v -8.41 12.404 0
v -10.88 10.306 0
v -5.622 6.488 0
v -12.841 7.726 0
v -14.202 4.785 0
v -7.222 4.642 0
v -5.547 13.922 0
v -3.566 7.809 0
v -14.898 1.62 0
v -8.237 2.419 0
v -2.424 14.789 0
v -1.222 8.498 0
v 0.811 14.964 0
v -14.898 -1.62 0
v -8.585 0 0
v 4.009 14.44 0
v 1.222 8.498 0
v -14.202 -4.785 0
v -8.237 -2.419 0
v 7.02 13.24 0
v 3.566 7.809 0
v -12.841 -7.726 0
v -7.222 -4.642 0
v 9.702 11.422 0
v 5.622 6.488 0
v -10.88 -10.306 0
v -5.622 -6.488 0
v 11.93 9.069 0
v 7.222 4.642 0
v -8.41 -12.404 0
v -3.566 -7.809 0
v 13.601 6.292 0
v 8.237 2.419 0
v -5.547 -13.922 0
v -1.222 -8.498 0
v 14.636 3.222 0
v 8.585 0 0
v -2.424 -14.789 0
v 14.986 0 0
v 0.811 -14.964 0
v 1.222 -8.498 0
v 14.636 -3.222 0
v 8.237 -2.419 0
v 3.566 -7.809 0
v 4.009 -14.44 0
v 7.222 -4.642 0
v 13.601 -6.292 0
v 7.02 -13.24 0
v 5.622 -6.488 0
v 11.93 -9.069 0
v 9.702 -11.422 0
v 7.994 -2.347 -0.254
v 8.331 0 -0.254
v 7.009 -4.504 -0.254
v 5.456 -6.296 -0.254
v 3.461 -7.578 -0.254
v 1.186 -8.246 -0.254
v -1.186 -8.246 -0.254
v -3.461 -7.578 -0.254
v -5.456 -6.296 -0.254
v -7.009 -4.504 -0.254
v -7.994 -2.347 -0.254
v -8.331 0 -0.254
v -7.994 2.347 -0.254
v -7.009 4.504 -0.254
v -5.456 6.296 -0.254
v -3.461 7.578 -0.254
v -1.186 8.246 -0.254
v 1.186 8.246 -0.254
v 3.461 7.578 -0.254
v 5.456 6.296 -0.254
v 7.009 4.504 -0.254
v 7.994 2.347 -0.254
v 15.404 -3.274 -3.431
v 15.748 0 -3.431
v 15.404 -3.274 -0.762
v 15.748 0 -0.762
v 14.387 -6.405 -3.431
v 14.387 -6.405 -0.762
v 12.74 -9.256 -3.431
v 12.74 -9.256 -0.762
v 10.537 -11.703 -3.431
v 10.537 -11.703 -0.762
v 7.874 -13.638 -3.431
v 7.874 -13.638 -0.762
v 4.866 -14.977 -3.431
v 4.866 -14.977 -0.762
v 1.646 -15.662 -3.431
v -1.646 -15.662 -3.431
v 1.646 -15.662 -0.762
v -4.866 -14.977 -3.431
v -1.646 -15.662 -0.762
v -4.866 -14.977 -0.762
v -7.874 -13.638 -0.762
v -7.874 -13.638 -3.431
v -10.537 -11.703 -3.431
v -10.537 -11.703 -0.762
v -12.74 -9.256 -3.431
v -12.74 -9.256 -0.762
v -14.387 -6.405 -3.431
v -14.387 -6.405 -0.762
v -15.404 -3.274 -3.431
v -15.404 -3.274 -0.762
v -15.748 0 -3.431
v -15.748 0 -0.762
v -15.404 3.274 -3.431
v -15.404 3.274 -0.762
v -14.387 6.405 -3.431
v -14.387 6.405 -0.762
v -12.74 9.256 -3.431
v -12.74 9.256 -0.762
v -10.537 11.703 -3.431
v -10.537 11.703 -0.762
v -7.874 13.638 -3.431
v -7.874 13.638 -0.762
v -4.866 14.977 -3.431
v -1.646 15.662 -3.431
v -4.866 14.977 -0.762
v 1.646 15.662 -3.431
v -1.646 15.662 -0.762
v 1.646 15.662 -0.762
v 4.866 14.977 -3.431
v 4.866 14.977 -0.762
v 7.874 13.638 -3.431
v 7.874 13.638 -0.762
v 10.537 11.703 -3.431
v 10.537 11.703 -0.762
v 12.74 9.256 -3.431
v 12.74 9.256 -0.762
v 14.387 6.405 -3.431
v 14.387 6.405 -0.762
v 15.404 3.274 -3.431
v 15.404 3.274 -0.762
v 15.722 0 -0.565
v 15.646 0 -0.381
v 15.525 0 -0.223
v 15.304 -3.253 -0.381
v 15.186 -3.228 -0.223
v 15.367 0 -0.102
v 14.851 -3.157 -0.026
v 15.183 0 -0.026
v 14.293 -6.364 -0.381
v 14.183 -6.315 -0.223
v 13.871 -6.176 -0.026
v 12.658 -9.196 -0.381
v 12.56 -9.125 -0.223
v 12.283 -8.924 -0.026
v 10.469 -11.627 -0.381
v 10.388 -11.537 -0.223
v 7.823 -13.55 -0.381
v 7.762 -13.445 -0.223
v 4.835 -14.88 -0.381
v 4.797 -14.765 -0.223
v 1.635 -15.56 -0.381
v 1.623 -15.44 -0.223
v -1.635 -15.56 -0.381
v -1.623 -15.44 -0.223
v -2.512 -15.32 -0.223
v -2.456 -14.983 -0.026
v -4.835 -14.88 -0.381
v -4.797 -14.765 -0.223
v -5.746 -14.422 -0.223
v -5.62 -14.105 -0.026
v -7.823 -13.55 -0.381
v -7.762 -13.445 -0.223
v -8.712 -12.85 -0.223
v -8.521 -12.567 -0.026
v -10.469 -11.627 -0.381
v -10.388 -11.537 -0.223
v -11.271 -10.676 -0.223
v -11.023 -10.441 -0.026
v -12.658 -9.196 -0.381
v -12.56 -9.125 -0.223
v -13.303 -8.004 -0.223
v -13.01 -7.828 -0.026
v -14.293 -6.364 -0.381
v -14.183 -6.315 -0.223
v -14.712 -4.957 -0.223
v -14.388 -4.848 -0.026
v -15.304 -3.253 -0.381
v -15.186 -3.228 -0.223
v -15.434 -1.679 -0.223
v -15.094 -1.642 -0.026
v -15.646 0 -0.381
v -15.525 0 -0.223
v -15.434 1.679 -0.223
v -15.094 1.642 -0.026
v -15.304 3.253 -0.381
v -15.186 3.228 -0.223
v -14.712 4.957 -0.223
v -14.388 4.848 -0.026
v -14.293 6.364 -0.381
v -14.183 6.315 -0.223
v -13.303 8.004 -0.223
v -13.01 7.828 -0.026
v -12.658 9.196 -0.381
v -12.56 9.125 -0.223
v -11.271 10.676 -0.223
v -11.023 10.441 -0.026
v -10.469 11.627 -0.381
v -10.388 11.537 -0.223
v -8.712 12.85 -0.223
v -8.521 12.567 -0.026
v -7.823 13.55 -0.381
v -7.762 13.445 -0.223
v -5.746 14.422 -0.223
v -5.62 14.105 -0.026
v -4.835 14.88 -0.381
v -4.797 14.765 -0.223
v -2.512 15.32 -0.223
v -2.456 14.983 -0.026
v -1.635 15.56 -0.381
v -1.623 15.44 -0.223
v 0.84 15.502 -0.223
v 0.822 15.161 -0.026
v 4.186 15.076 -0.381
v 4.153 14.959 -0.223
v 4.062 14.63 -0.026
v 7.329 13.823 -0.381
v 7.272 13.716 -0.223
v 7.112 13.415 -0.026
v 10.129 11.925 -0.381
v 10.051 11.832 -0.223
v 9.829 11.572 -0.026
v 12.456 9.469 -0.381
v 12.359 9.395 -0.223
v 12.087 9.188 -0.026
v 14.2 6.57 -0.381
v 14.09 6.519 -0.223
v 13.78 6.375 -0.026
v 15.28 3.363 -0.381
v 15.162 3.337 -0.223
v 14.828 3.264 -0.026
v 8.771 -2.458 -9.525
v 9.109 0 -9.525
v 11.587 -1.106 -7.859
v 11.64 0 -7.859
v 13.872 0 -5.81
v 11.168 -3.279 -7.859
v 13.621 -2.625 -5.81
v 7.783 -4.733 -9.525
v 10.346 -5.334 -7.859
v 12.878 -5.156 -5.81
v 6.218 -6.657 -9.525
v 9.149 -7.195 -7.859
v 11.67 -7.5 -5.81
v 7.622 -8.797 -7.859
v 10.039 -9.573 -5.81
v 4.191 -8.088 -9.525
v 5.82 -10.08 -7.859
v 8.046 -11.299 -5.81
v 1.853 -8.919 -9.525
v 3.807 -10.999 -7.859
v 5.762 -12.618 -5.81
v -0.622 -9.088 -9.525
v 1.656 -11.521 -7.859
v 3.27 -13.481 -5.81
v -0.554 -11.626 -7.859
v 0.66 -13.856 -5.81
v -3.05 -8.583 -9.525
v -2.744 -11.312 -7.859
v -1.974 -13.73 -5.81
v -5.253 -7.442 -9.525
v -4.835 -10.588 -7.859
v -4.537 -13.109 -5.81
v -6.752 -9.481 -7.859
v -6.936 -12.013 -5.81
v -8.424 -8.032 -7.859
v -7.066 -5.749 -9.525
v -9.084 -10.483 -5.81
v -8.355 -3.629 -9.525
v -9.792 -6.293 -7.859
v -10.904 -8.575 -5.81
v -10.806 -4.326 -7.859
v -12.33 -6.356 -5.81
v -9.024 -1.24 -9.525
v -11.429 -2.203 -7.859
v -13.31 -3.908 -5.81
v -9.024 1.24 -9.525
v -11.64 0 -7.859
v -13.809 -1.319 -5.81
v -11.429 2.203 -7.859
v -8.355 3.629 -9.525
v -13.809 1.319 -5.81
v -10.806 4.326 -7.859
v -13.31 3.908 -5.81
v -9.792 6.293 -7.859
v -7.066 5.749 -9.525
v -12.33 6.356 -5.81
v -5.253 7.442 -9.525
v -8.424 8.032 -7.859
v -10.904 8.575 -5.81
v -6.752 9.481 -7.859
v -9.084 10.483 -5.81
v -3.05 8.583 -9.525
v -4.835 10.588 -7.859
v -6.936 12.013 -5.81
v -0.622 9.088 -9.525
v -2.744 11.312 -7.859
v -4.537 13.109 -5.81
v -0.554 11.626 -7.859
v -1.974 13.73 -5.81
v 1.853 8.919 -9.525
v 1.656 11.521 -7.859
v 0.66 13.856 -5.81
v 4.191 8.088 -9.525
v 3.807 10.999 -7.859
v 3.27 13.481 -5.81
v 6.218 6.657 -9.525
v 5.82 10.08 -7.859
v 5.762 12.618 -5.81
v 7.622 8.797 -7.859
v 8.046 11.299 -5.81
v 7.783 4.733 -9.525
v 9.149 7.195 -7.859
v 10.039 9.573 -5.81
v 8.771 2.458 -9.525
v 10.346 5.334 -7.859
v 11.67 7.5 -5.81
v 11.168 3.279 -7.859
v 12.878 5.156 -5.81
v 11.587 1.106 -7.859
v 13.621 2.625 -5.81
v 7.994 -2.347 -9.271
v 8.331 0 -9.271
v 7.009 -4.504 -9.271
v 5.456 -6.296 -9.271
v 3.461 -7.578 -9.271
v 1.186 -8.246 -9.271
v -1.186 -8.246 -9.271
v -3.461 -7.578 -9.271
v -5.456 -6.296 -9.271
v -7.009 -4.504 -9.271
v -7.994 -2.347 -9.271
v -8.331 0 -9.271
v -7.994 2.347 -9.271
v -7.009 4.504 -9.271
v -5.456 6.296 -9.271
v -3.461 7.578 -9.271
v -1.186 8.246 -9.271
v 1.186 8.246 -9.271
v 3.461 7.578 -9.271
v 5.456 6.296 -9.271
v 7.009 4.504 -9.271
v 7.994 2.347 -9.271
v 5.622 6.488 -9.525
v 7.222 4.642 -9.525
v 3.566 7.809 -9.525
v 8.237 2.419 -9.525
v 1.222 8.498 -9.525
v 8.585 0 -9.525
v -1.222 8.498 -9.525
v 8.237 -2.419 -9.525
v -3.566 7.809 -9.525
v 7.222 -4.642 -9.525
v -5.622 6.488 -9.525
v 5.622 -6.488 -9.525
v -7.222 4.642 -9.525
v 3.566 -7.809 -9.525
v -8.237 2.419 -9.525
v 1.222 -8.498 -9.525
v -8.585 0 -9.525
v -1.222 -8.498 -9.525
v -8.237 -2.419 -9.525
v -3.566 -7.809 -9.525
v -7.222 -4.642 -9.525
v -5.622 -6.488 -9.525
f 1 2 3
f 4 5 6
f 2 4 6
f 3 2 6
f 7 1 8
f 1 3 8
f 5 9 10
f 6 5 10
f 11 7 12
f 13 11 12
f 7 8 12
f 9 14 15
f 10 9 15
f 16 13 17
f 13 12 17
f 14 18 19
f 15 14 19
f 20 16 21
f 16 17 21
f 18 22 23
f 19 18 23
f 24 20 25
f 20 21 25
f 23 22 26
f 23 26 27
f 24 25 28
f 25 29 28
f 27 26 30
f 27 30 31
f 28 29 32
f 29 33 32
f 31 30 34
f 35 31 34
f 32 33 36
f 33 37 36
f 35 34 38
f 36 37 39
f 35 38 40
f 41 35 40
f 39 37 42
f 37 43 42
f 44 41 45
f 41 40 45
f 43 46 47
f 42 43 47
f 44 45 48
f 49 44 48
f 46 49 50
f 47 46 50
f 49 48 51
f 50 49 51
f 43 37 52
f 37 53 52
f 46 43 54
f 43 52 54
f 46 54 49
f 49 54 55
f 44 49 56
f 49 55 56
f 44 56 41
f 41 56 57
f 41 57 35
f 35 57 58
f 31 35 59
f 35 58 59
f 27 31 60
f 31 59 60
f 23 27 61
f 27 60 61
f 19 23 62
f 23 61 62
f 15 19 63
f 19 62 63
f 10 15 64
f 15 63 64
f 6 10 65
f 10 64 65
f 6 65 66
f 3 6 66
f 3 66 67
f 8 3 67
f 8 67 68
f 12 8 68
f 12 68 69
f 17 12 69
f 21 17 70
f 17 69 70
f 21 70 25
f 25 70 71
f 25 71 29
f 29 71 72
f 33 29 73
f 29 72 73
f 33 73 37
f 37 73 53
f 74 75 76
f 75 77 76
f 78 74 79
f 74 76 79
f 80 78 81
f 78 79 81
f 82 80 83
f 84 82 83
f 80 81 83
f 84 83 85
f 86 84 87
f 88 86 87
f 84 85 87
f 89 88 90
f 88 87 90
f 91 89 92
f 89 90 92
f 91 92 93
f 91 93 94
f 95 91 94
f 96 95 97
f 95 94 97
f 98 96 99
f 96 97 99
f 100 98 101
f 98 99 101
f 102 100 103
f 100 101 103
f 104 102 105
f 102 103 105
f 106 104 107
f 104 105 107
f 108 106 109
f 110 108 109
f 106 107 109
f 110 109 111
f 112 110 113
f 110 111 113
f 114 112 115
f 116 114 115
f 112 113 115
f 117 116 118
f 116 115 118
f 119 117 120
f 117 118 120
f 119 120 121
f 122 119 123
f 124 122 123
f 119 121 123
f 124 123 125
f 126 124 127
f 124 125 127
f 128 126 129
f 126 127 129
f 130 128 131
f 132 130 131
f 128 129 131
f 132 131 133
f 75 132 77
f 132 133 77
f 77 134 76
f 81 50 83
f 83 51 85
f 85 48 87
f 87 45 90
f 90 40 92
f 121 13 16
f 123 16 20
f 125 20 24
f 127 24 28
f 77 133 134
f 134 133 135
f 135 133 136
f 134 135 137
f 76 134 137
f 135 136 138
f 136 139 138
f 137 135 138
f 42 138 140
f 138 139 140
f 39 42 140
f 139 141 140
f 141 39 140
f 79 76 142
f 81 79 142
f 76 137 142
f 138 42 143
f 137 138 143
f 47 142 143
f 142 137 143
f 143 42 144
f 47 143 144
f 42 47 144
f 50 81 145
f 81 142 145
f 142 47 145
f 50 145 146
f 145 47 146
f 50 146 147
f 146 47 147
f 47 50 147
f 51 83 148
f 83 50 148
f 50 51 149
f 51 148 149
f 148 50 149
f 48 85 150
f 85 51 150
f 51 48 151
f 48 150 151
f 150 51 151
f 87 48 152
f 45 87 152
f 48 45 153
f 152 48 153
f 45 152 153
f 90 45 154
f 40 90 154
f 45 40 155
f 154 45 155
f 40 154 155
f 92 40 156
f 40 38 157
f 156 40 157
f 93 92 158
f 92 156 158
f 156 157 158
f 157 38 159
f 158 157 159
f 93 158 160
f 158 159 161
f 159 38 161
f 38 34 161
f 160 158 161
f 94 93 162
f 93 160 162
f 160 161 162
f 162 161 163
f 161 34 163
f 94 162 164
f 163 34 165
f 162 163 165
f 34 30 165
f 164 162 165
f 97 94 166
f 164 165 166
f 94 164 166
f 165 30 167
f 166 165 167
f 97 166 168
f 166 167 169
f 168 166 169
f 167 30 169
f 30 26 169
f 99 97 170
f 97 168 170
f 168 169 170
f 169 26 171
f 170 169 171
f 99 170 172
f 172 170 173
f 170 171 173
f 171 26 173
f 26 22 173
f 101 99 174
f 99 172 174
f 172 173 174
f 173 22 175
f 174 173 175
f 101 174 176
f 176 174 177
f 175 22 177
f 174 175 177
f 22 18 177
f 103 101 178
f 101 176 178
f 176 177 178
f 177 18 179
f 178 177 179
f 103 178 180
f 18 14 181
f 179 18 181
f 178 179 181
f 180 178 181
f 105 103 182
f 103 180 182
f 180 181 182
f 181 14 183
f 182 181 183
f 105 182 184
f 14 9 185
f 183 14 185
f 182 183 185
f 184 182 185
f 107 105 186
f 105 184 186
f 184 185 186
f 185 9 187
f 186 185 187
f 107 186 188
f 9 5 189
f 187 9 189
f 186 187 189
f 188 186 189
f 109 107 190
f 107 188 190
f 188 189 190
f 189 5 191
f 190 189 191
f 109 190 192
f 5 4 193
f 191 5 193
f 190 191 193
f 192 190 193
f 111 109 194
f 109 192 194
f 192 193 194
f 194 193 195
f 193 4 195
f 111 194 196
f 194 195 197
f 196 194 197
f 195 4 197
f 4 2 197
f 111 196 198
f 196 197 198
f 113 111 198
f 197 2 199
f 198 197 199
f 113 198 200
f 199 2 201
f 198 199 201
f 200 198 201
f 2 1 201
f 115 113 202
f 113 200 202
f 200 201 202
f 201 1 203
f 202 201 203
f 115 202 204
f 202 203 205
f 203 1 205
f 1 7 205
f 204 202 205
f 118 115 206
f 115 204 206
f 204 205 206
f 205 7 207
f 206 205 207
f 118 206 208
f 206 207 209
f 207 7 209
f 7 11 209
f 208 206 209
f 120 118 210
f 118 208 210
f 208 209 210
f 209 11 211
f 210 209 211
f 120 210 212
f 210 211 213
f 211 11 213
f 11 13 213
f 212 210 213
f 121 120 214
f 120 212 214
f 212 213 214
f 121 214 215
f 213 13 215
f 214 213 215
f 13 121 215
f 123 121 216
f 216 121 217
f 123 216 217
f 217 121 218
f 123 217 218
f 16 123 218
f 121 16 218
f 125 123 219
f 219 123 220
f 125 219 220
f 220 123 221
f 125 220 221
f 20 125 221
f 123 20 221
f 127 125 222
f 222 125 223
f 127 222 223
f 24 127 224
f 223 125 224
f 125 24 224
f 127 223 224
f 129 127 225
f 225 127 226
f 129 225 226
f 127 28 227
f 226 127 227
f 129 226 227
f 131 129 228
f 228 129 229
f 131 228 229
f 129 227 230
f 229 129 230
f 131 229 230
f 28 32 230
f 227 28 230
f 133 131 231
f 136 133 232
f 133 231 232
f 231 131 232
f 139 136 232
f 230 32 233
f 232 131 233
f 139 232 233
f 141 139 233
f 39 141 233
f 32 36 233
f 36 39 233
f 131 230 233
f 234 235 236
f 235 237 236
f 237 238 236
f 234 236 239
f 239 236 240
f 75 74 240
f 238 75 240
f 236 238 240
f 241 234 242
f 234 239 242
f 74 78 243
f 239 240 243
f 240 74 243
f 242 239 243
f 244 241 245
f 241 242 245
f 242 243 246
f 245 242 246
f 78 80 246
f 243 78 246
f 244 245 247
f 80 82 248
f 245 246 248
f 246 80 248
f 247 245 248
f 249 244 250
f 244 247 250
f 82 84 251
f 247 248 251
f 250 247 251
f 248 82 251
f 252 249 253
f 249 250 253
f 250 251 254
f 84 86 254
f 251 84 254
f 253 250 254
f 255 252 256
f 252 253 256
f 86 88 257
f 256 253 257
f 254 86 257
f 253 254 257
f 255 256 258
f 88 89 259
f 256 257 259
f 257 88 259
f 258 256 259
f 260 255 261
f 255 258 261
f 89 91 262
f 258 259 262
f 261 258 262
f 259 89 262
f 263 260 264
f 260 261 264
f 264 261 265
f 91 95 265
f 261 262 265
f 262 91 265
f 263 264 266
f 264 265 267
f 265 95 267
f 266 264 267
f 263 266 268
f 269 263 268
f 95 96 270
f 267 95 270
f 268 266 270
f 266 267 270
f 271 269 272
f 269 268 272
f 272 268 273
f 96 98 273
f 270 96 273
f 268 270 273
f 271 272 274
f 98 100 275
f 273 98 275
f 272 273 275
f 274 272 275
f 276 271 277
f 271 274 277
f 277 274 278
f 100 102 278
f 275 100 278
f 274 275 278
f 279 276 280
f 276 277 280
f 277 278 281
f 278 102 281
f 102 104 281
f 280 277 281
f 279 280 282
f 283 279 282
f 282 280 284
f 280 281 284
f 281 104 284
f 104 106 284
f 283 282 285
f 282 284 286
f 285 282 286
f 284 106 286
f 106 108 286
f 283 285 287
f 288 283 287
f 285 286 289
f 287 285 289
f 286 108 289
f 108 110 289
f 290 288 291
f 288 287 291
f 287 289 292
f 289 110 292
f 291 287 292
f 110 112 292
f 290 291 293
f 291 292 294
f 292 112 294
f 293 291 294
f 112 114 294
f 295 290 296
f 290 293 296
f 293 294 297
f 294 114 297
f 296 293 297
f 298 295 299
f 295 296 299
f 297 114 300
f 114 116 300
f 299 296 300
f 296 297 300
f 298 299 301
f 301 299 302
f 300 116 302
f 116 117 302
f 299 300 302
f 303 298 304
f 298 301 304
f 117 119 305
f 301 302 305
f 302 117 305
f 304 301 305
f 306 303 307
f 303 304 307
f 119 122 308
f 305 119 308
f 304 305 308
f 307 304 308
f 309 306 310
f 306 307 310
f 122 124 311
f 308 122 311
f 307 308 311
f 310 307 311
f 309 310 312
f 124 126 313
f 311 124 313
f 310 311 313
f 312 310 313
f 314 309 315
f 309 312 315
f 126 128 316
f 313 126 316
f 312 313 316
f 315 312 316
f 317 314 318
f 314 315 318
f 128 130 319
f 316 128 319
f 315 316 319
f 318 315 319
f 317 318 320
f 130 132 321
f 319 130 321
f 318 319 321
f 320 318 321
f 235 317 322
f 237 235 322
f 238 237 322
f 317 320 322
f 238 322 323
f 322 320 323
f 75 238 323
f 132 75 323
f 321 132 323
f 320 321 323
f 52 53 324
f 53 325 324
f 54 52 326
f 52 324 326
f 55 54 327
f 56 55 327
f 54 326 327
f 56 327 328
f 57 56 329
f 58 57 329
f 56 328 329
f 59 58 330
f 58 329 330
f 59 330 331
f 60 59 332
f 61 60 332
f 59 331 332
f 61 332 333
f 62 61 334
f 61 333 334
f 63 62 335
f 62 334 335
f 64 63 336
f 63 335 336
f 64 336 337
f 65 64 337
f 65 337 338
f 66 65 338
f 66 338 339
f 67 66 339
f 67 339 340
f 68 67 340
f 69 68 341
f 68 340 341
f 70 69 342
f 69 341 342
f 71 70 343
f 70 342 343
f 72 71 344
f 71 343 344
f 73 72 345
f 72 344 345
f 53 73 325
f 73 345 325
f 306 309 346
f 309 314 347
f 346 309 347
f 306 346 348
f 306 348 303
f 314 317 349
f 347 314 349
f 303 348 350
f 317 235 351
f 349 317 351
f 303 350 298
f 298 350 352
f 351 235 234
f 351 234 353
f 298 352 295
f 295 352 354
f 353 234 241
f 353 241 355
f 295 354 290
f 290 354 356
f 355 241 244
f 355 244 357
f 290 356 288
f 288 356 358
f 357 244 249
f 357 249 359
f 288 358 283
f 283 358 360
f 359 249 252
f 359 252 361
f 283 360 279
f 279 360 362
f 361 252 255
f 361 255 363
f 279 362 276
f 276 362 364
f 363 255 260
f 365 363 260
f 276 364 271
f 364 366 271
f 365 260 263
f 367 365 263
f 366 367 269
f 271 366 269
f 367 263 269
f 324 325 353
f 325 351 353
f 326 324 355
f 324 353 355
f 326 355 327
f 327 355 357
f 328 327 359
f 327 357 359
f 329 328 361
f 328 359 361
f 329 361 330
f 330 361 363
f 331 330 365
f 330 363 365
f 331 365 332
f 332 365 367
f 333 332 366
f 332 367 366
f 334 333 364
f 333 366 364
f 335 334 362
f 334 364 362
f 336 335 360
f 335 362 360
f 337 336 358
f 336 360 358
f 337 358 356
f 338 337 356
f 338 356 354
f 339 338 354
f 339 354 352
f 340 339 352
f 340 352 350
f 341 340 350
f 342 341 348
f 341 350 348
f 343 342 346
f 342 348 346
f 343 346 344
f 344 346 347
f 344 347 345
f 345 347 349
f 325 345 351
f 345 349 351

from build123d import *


with BuildPart() as part:
    # Sketch1 → Revolve1 (revolve)
    with BuildSketch(Plane(origin=(0, 0, 0), x_dir=(0, 0, -1), z_dir=(1, 0, 0))):
        with BuildLine():
            Line((9.271, 8.3312), (9.525, 8.5852))
            Line((9.525, 8.5852), (9.525, 9.109220524))
            ThreePointArc((9.525, 9.109220524), (6.878832982, 12.796695255), (3.430721893, 15.748))
            Line((3.430721893, 15.748), (0.762, 15.748))
            ThreePointArc((0.762, 15.748), (0.223184633, 15.524815367), (0, 14.986))
            Line((0, 14.986), (0, 8.5852))
            Line((0, 8.5852), (0.254, 8.3312))
            Line((0.254, 8.3312), (9.271, 8.3312))
        make_face()
    revolve(axis=Axis((0, 0, -32.643147388), (0, 0, -1)))


solid = part.part
